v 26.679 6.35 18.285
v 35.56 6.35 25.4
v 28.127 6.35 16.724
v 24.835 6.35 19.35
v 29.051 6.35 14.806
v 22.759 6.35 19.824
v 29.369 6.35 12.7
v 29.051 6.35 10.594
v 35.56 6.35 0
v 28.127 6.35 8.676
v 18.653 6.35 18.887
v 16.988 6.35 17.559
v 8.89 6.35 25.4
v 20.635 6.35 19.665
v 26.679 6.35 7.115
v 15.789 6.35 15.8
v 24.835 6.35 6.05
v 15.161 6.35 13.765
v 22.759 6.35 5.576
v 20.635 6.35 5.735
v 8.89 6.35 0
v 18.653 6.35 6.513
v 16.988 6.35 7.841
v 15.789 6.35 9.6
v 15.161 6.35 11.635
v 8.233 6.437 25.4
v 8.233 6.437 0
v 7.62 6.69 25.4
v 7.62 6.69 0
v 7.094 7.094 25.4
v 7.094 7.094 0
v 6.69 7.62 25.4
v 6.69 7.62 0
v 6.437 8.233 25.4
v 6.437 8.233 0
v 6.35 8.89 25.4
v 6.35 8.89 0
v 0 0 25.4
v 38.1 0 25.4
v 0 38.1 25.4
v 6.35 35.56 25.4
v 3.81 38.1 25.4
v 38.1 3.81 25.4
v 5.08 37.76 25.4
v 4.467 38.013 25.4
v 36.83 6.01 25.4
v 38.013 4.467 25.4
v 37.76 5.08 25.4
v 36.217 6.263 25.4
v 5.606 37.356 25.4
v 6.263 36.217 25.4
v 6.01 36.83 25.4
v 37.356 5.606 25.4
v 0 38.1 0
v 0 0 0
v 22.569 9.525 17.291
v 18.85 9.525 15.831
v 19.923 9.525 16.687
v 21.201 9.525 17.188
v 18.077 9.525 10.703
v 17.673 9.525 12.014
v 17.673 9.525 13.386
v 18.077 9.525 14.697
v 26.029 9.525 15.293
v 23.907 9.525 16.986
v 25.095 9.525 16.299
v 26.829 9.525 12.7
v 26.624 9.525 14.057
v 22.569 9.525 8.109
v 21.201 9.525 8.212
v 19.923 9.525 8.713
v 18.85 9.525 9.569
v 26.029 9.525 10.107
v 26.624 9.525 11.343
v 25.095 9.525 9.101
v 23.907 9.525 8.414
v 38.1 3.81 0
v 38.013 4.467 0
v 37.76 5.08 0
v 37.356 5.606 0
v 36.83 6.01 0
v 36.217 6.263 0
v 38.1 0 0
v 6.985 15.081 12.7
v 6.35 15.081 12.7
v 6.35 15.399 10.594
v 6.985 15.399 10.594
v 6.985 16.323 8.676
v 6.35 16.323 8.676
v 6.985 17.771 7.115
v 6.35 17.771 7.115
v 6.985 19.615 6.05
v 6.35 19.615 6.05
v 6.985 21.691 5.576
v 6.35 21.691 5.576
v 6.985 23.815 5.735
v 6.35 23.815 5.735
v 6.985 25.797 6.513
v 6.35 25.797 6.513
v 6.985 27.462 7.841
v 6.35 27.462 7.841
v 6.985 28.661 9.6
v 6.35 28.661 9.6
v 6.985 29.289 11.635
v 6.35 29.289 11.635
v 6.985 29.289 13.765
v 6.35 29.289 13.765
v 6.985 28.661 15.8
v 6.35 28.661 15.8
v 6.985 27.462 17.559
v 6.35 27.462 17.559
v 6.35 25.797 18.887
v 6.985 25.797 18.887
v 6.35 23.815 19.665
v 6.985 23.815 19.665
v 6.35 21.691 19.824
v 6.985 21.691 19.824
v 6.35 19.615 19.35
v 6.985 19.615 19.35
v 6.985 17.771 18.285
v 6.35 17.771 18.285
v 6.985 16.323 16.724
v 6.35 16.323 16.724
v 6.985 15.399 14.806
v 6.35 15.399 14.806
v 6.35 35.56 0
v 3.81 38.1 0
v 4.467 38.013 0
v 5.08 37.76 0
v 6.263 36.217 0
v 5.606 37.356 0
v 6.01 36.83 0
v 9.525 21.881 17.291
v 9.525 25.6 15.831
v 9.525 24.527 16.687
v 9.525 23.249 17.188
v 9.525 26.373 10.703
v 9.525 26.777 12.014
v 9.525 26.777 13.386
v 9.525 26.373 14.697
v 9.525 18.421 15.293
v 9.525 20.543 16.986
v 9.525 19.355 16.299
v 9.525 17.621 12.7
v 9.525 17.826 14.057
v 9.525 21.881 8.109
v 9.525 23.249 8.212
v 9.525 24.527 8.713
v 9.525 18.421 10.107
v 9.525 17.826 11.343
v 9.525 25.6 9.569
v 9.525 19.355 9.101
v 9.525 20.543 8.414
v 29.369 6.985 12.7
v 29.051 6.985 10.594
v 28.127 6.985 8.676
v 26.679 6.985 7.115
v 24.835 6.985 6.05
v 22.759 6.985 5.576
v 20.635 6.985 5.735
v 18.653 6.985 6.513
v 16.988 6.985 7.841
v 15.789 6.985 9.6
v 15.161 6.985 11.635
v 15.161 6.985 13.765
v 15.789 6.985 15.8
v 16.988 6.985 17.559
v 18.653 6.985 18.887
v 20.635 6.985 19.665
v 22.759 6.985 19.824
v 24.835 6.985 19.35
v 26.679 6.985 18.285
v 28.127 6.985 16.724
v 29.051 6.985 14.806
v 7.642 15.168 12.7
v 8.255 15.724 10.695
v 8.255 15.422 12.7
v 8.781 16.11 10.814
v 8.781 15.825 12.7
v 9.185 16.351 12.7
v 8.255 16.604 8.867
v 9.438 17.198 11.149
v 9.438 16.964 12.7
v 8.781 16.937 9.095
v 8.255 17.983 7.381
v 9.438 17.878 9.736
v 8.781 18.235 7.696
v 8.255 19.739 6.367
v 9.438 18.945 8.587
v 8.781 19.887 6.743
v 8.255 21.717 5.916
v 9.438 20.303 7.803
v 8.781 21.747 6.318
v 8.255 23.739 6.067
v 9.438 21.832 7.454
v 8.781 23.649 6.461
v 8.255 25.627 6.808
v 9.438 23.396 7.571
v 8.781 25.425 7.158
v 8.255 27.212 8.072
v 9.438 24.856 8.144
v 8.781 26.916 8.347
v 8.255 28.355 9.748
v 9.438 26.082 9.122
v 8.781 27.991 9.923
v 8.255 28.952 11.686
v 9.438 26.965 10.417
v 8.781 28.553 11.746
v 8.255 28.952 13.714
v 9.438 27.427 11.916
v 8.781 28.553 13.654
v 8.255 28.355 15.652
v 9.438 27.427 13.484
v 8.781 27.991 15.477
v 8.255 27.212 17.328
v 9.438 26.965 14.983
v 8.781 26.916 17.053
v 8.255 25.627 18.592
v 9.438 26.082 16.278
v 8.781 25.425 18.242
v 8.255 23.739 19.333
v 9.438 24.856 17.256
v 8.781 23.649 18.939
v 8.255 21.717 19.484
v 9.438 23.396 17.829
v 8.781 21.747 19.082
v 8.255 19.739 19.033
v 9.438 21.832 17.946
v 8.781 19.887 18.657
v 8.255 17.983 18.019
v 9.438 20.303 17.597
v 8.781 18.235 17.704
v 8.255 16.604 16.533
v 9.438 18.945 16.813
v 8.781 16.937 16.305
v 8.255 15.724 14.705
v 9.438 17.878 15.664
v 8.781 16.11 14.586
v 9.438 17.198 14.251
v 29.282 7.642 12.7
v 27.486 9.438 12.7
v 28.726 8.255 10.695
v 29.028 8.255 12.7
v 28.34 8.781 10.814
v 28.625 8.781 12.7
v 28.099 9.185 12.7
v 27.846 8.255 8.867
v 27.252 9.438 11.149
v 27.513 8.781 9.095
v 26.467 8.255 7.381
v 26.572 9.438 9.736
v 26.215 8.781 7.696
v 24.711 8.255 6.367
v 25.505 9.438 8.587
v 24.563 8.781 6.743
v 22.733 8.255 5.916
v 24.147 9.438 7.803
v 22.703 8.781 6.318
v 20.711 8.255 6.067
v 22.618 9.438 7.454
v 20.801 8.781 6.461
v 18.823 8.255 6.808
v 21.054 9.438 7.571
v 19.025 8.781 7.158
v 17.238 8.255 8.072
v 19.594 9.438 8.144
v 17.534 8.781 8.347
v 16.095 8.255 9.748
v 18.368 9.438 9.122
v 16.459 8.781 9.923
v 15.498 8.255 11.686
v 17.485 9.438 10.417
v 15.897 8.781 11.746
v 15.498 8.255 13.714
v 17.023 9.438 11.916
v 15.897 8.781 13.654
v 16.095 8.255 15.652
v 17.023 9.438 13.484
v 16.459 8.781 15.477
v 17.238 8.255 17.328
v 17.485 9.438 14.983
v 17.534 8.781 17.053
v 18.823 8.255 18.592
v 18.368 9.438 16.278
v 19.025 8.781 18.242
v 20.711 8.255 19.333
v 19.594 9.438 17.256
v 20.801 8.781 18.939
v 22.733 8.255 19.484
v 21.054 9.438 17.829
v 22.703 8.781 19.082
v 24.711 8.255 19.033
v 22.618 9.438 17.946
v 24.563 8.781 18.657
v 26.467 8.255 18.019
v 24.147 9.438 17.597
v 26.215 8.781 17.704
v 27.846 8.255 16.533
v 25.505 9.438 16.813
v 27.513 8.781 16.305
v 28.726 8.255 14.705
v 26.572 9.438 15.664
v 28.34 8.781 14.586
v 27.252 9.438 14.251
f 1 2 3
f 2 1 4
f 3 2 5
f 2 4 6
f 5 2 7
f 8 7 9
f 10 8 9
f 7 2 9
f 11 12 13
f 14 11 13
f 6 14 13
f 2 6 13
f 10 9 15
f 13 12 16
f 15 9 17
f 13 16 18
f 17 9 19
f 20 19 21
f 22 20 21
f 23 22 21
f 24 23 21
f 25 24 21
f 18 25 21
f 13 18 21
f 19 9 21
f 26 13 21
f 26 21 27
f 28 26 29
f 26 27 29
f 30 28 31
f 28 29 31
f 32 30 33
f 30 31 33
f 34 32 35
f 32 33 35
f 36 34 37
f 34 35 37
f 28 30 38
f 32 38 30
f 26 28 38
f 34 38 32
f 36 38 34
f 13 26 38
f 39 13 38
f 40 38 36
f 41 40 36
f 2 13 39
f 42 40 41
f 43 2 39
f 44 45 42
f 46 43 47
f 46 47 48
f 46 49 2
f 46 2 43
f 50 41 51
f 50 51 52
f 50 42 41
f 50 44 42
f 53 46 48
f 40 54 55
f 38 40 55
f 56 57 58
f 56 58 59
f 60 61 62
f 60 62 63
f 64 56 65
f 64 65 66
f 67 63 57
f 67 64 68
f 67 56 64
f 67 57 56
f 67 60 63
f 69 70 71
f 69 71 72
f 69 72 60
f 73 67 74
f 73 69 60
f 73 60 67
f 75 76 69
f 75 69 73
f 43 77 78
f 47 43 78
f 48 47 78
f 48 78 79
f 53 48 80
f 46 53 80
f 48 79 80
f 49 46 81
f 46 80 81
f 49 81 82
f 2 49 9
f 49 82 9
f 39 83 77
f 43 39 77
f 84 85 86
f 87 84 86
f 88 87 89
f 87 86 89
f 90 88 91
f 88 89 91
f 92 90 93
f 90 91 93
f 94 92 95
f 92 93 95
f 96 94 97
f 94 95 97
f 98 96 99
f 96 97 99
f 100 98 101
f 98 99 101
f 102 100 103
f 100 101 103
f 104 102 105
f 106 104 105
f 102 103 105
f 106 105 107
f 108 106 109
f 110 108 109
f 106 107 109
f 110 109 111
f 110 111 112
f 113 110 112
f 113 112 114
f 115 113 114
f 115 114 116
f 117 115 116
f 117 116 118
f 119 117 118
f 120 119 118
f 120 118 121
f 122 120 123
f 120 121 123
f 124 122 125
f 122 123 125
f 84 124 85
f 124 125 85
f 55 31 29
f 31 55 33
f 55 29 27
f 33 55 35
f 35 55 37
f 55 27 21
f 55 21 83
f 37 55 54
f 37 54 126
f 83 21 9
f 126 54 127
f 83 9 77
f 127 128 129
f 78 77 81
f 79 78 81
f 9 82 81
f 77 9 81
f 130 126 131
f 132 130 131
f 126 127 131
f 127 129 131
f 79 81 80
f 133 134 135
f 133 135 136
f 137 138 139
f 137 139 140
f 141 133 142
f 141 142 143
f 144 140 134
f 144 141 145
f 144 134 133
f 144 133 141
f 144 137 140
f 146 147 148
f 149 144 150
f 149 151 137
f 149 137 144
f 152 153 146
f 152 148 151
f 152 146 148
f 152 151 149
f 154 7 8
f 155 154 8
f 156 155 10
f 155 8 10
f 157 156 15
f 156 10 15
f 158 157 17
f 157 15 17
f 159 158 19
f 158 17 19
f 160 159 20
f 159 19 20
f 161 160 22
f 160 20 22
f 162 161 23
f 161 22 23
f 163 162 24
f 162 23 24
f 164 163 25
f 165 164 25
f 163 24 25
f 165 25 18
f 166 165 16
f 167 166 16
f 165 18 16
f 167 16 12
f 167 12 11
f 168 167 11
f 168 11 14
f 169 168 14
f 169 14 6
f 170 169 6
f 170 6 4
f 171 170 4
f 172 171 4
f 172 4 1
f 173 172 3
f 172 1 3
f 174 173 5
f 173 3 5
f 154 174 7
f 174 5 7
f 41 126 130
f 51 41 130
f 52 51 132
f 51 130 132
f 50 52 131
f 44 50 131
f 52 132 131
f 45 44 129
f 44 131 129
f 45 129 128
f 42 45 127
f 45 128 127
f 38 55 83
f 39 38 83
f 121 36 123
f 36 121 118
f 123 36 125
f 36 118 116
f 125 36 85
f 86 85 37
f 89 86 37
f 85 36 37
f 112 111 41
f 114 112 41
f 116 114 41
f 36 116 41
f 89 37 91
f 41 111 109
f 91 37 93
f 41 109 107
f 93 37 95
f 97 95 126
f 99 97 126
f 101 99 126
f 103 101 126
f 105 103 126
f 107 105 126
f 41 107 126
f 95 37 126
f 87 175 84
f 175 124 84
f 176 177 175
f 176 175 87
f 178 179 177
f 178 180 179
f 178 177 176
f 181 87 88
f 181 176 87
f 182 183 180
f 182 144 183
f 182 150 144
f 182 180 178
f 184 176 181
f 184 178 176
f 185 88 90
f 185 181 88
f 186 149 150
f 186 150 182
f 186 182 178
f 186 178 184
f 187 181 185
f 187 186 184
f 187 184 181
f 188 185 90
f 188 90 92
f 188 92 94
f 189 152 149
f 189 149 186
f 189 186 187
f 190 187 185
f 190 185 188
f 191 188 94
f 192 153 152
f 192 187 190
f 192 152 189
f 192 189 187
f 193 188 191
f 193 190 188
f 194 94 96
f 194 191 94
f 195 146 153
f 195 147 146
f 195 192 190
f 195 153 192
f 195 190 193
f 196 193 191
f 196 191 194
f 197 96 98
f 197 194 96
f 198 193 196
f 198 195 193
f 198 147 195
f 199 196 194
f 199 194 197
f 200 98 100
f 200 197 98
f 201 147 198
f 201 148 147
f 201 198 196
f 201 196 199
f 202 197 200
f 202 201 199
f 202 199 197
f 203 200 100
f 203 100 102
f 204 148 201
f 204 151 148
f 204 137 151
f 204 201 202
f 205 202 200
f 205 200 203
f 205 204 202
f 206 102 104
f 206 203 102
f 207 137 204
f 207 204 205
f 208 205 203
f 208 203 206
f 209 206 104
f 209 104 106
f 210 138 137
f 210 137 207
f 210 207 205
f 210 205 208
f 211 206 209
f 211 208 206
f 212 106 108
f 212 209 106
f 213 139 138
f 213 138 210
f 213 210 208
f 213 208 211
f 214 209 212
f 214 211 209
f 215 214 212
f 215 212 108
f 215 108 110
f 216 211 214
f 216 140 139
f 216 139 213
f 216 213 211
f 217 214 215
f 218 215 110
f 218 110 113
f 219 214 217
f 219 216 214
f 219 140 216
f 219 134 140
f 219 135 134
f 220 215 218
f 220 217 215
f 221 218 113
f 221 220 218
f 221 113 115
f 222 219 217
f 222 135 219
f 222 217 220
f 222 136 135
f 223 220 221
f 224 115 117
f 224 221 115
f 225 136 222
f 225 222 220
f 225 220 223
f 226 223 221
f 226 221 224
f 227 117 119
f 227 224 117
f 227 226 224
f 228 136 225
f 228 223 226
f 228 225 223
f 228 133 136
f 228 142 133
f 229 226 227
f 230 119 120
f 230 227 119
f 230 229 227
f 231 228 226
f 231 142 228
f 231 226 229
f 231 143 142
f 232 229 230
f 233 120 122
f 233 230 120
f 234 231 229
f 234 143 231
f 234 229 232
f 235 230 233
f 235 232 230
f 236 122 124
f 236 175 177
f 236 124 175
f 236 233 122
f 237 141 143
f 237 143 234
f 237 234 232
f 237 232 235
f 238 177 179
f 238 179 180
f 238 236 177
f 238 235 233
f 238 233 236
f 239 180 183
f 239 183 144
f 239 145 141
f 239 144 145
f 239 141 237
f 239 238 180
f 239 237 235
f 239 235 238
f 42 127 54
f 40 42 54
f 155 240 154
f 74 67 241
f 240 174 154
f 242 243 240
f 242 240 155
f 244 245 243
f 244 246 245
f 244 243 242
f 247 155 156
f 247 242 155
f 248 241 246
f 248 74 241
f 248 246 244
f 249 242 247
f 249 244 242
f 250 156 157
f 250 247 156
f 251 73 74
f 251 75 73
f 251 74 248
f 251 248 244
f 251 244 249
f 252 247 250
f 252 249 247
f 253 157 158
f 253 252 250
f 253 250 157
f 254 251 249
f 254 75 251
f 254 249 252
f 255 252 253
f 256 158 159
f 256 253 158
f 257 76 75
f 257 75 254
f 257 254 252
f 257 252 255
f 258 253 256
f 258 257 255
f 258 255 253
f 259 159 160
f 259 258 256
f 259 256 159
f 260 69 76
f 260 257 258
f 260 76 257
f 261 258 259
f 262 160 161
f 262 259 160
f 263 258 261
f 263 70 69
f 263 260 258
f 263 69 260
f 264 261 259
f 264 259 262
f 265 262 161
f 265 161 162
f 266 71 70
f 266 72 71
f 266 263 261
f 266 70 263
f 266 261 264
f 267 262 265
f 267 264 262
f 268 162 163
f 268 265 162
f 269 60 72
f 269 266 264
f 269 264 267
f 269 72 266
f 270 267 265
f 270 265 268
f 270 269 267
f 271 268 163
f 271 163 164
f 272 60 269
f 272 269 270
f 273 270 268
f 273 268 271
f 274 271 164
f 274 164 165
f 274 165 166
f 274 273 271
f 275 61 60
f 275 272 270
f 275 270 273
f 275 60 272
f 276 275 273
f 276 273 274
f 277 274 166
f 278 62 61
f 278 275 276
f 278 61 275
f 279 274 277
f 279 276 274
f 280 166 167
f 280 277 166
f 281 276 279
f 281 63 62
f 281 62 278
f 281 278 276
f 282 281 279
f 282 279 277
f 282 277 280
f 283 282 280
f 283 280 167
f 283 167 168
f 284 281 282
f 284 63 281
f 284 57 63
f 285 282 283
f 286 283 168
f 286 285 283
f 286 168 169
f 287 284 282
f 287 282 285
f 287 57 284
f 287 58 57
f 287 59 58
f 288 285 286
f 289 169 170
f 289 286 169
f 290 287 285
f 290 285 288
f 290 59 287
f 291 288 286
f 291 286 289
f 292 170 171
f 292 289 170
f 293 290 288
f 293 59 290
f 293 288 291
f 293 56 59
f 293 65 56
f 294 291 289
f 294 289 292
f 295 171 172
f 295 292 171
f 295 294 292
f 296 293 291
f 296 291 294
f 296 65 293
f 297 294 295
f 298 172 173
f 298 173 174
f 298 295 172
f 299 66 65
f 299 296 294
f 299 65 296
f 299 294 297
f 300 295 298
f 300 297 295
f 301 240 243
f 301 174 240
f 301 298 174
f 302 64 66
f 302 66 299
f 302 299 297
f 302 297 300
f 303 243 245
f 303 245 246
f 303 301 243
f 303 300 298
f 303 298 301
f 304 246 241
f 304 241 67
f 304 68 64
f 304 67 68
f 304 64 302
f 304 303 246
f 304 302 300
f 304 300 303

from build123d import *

# Parameters (mm, degrees)
BOSS_EXTRUDE1_DEPTH = 25.4
SKETCH2_R           = 7.14375
BOSS_EXTRUDE2_DEPTH = 3.175
FILLET1_R           = 2.54
SKETCH3_R           = 7.14375
BOSS_EXTRUDE3_DEPTH = 3.175
FILLET2_R           = 2.54


with BuildPart() as part:
    # Sketch1 → Boss-Extrude1 (new body)
    with BuildSketch(Plane.XY):
        with BuildLine():
            Line((0, 0), (38.1, 0))
            Line((38.1, 0), (38.1, 3.81))
            ThreePointArc((38.1, 3.81), (37.356051224, 5.606051224), (35.56, 6.35))
            Line((35.56, 6.35), (8.89, 6.35))
            ThreePointArc((8.89, 6.35), (7.093948776, 7.093948776), (6.35, 8.89))
            Line((6.35, 8.89), (6.35, 35.56))
            ThreePointArc((6.35, 35.56), (5.606051224, 37.356051224), (3.81, 38.1))
            Line((3.81, 38.1), (0, 38.1))
            Line((0, 38.1), (0, 0))
        make_face()
    extrude(amount=BOSS_EXTRUDE1_DEPTH)

    # Sketch2 → Boss-Extrude2 (add)
    with BuildSketch(Plane(origin=(0, 6.35, 0), x_dir=(1, 0, 0), z_dir=(0, 1, 0))):
        with Locations((22.225, -12.7)):
            Circle(SKETCH2_R)
    extrude(amount=BOSS_EXTRUDE2_DEPTH)

    # Fillet1
    fillet1_edges = [part.edges().sort_by_distance(p)[0] for p in [
        (15.08125, 9.525, 12.7),
    ]]
    fillet(fillet1_edges, radius=FILLET1_R)

    # Sketch3 → Boss-Extrude3 (add)
    with BuildSketch(Plane(origin=(6.35, 0, 0), x_dir=(0, 0, -1), z_dir=(1, 0, 0))):
        with Locations(Location((-12.7, 22.225, 0), (0, 0, 270))):
            Circle(SKETCH3_R)
    extrude(amount=BOSS_EXTRUDE3_DEPTH)

    # Fillet2
    fillet2_edges = [part.edges().sort_by_distance(p)[0] for p in [
        (9.525, 29.36875, 12.7),
    ]]
    fillet(fillet2_edges, radius=FILLET2_R)


solid = part.part
